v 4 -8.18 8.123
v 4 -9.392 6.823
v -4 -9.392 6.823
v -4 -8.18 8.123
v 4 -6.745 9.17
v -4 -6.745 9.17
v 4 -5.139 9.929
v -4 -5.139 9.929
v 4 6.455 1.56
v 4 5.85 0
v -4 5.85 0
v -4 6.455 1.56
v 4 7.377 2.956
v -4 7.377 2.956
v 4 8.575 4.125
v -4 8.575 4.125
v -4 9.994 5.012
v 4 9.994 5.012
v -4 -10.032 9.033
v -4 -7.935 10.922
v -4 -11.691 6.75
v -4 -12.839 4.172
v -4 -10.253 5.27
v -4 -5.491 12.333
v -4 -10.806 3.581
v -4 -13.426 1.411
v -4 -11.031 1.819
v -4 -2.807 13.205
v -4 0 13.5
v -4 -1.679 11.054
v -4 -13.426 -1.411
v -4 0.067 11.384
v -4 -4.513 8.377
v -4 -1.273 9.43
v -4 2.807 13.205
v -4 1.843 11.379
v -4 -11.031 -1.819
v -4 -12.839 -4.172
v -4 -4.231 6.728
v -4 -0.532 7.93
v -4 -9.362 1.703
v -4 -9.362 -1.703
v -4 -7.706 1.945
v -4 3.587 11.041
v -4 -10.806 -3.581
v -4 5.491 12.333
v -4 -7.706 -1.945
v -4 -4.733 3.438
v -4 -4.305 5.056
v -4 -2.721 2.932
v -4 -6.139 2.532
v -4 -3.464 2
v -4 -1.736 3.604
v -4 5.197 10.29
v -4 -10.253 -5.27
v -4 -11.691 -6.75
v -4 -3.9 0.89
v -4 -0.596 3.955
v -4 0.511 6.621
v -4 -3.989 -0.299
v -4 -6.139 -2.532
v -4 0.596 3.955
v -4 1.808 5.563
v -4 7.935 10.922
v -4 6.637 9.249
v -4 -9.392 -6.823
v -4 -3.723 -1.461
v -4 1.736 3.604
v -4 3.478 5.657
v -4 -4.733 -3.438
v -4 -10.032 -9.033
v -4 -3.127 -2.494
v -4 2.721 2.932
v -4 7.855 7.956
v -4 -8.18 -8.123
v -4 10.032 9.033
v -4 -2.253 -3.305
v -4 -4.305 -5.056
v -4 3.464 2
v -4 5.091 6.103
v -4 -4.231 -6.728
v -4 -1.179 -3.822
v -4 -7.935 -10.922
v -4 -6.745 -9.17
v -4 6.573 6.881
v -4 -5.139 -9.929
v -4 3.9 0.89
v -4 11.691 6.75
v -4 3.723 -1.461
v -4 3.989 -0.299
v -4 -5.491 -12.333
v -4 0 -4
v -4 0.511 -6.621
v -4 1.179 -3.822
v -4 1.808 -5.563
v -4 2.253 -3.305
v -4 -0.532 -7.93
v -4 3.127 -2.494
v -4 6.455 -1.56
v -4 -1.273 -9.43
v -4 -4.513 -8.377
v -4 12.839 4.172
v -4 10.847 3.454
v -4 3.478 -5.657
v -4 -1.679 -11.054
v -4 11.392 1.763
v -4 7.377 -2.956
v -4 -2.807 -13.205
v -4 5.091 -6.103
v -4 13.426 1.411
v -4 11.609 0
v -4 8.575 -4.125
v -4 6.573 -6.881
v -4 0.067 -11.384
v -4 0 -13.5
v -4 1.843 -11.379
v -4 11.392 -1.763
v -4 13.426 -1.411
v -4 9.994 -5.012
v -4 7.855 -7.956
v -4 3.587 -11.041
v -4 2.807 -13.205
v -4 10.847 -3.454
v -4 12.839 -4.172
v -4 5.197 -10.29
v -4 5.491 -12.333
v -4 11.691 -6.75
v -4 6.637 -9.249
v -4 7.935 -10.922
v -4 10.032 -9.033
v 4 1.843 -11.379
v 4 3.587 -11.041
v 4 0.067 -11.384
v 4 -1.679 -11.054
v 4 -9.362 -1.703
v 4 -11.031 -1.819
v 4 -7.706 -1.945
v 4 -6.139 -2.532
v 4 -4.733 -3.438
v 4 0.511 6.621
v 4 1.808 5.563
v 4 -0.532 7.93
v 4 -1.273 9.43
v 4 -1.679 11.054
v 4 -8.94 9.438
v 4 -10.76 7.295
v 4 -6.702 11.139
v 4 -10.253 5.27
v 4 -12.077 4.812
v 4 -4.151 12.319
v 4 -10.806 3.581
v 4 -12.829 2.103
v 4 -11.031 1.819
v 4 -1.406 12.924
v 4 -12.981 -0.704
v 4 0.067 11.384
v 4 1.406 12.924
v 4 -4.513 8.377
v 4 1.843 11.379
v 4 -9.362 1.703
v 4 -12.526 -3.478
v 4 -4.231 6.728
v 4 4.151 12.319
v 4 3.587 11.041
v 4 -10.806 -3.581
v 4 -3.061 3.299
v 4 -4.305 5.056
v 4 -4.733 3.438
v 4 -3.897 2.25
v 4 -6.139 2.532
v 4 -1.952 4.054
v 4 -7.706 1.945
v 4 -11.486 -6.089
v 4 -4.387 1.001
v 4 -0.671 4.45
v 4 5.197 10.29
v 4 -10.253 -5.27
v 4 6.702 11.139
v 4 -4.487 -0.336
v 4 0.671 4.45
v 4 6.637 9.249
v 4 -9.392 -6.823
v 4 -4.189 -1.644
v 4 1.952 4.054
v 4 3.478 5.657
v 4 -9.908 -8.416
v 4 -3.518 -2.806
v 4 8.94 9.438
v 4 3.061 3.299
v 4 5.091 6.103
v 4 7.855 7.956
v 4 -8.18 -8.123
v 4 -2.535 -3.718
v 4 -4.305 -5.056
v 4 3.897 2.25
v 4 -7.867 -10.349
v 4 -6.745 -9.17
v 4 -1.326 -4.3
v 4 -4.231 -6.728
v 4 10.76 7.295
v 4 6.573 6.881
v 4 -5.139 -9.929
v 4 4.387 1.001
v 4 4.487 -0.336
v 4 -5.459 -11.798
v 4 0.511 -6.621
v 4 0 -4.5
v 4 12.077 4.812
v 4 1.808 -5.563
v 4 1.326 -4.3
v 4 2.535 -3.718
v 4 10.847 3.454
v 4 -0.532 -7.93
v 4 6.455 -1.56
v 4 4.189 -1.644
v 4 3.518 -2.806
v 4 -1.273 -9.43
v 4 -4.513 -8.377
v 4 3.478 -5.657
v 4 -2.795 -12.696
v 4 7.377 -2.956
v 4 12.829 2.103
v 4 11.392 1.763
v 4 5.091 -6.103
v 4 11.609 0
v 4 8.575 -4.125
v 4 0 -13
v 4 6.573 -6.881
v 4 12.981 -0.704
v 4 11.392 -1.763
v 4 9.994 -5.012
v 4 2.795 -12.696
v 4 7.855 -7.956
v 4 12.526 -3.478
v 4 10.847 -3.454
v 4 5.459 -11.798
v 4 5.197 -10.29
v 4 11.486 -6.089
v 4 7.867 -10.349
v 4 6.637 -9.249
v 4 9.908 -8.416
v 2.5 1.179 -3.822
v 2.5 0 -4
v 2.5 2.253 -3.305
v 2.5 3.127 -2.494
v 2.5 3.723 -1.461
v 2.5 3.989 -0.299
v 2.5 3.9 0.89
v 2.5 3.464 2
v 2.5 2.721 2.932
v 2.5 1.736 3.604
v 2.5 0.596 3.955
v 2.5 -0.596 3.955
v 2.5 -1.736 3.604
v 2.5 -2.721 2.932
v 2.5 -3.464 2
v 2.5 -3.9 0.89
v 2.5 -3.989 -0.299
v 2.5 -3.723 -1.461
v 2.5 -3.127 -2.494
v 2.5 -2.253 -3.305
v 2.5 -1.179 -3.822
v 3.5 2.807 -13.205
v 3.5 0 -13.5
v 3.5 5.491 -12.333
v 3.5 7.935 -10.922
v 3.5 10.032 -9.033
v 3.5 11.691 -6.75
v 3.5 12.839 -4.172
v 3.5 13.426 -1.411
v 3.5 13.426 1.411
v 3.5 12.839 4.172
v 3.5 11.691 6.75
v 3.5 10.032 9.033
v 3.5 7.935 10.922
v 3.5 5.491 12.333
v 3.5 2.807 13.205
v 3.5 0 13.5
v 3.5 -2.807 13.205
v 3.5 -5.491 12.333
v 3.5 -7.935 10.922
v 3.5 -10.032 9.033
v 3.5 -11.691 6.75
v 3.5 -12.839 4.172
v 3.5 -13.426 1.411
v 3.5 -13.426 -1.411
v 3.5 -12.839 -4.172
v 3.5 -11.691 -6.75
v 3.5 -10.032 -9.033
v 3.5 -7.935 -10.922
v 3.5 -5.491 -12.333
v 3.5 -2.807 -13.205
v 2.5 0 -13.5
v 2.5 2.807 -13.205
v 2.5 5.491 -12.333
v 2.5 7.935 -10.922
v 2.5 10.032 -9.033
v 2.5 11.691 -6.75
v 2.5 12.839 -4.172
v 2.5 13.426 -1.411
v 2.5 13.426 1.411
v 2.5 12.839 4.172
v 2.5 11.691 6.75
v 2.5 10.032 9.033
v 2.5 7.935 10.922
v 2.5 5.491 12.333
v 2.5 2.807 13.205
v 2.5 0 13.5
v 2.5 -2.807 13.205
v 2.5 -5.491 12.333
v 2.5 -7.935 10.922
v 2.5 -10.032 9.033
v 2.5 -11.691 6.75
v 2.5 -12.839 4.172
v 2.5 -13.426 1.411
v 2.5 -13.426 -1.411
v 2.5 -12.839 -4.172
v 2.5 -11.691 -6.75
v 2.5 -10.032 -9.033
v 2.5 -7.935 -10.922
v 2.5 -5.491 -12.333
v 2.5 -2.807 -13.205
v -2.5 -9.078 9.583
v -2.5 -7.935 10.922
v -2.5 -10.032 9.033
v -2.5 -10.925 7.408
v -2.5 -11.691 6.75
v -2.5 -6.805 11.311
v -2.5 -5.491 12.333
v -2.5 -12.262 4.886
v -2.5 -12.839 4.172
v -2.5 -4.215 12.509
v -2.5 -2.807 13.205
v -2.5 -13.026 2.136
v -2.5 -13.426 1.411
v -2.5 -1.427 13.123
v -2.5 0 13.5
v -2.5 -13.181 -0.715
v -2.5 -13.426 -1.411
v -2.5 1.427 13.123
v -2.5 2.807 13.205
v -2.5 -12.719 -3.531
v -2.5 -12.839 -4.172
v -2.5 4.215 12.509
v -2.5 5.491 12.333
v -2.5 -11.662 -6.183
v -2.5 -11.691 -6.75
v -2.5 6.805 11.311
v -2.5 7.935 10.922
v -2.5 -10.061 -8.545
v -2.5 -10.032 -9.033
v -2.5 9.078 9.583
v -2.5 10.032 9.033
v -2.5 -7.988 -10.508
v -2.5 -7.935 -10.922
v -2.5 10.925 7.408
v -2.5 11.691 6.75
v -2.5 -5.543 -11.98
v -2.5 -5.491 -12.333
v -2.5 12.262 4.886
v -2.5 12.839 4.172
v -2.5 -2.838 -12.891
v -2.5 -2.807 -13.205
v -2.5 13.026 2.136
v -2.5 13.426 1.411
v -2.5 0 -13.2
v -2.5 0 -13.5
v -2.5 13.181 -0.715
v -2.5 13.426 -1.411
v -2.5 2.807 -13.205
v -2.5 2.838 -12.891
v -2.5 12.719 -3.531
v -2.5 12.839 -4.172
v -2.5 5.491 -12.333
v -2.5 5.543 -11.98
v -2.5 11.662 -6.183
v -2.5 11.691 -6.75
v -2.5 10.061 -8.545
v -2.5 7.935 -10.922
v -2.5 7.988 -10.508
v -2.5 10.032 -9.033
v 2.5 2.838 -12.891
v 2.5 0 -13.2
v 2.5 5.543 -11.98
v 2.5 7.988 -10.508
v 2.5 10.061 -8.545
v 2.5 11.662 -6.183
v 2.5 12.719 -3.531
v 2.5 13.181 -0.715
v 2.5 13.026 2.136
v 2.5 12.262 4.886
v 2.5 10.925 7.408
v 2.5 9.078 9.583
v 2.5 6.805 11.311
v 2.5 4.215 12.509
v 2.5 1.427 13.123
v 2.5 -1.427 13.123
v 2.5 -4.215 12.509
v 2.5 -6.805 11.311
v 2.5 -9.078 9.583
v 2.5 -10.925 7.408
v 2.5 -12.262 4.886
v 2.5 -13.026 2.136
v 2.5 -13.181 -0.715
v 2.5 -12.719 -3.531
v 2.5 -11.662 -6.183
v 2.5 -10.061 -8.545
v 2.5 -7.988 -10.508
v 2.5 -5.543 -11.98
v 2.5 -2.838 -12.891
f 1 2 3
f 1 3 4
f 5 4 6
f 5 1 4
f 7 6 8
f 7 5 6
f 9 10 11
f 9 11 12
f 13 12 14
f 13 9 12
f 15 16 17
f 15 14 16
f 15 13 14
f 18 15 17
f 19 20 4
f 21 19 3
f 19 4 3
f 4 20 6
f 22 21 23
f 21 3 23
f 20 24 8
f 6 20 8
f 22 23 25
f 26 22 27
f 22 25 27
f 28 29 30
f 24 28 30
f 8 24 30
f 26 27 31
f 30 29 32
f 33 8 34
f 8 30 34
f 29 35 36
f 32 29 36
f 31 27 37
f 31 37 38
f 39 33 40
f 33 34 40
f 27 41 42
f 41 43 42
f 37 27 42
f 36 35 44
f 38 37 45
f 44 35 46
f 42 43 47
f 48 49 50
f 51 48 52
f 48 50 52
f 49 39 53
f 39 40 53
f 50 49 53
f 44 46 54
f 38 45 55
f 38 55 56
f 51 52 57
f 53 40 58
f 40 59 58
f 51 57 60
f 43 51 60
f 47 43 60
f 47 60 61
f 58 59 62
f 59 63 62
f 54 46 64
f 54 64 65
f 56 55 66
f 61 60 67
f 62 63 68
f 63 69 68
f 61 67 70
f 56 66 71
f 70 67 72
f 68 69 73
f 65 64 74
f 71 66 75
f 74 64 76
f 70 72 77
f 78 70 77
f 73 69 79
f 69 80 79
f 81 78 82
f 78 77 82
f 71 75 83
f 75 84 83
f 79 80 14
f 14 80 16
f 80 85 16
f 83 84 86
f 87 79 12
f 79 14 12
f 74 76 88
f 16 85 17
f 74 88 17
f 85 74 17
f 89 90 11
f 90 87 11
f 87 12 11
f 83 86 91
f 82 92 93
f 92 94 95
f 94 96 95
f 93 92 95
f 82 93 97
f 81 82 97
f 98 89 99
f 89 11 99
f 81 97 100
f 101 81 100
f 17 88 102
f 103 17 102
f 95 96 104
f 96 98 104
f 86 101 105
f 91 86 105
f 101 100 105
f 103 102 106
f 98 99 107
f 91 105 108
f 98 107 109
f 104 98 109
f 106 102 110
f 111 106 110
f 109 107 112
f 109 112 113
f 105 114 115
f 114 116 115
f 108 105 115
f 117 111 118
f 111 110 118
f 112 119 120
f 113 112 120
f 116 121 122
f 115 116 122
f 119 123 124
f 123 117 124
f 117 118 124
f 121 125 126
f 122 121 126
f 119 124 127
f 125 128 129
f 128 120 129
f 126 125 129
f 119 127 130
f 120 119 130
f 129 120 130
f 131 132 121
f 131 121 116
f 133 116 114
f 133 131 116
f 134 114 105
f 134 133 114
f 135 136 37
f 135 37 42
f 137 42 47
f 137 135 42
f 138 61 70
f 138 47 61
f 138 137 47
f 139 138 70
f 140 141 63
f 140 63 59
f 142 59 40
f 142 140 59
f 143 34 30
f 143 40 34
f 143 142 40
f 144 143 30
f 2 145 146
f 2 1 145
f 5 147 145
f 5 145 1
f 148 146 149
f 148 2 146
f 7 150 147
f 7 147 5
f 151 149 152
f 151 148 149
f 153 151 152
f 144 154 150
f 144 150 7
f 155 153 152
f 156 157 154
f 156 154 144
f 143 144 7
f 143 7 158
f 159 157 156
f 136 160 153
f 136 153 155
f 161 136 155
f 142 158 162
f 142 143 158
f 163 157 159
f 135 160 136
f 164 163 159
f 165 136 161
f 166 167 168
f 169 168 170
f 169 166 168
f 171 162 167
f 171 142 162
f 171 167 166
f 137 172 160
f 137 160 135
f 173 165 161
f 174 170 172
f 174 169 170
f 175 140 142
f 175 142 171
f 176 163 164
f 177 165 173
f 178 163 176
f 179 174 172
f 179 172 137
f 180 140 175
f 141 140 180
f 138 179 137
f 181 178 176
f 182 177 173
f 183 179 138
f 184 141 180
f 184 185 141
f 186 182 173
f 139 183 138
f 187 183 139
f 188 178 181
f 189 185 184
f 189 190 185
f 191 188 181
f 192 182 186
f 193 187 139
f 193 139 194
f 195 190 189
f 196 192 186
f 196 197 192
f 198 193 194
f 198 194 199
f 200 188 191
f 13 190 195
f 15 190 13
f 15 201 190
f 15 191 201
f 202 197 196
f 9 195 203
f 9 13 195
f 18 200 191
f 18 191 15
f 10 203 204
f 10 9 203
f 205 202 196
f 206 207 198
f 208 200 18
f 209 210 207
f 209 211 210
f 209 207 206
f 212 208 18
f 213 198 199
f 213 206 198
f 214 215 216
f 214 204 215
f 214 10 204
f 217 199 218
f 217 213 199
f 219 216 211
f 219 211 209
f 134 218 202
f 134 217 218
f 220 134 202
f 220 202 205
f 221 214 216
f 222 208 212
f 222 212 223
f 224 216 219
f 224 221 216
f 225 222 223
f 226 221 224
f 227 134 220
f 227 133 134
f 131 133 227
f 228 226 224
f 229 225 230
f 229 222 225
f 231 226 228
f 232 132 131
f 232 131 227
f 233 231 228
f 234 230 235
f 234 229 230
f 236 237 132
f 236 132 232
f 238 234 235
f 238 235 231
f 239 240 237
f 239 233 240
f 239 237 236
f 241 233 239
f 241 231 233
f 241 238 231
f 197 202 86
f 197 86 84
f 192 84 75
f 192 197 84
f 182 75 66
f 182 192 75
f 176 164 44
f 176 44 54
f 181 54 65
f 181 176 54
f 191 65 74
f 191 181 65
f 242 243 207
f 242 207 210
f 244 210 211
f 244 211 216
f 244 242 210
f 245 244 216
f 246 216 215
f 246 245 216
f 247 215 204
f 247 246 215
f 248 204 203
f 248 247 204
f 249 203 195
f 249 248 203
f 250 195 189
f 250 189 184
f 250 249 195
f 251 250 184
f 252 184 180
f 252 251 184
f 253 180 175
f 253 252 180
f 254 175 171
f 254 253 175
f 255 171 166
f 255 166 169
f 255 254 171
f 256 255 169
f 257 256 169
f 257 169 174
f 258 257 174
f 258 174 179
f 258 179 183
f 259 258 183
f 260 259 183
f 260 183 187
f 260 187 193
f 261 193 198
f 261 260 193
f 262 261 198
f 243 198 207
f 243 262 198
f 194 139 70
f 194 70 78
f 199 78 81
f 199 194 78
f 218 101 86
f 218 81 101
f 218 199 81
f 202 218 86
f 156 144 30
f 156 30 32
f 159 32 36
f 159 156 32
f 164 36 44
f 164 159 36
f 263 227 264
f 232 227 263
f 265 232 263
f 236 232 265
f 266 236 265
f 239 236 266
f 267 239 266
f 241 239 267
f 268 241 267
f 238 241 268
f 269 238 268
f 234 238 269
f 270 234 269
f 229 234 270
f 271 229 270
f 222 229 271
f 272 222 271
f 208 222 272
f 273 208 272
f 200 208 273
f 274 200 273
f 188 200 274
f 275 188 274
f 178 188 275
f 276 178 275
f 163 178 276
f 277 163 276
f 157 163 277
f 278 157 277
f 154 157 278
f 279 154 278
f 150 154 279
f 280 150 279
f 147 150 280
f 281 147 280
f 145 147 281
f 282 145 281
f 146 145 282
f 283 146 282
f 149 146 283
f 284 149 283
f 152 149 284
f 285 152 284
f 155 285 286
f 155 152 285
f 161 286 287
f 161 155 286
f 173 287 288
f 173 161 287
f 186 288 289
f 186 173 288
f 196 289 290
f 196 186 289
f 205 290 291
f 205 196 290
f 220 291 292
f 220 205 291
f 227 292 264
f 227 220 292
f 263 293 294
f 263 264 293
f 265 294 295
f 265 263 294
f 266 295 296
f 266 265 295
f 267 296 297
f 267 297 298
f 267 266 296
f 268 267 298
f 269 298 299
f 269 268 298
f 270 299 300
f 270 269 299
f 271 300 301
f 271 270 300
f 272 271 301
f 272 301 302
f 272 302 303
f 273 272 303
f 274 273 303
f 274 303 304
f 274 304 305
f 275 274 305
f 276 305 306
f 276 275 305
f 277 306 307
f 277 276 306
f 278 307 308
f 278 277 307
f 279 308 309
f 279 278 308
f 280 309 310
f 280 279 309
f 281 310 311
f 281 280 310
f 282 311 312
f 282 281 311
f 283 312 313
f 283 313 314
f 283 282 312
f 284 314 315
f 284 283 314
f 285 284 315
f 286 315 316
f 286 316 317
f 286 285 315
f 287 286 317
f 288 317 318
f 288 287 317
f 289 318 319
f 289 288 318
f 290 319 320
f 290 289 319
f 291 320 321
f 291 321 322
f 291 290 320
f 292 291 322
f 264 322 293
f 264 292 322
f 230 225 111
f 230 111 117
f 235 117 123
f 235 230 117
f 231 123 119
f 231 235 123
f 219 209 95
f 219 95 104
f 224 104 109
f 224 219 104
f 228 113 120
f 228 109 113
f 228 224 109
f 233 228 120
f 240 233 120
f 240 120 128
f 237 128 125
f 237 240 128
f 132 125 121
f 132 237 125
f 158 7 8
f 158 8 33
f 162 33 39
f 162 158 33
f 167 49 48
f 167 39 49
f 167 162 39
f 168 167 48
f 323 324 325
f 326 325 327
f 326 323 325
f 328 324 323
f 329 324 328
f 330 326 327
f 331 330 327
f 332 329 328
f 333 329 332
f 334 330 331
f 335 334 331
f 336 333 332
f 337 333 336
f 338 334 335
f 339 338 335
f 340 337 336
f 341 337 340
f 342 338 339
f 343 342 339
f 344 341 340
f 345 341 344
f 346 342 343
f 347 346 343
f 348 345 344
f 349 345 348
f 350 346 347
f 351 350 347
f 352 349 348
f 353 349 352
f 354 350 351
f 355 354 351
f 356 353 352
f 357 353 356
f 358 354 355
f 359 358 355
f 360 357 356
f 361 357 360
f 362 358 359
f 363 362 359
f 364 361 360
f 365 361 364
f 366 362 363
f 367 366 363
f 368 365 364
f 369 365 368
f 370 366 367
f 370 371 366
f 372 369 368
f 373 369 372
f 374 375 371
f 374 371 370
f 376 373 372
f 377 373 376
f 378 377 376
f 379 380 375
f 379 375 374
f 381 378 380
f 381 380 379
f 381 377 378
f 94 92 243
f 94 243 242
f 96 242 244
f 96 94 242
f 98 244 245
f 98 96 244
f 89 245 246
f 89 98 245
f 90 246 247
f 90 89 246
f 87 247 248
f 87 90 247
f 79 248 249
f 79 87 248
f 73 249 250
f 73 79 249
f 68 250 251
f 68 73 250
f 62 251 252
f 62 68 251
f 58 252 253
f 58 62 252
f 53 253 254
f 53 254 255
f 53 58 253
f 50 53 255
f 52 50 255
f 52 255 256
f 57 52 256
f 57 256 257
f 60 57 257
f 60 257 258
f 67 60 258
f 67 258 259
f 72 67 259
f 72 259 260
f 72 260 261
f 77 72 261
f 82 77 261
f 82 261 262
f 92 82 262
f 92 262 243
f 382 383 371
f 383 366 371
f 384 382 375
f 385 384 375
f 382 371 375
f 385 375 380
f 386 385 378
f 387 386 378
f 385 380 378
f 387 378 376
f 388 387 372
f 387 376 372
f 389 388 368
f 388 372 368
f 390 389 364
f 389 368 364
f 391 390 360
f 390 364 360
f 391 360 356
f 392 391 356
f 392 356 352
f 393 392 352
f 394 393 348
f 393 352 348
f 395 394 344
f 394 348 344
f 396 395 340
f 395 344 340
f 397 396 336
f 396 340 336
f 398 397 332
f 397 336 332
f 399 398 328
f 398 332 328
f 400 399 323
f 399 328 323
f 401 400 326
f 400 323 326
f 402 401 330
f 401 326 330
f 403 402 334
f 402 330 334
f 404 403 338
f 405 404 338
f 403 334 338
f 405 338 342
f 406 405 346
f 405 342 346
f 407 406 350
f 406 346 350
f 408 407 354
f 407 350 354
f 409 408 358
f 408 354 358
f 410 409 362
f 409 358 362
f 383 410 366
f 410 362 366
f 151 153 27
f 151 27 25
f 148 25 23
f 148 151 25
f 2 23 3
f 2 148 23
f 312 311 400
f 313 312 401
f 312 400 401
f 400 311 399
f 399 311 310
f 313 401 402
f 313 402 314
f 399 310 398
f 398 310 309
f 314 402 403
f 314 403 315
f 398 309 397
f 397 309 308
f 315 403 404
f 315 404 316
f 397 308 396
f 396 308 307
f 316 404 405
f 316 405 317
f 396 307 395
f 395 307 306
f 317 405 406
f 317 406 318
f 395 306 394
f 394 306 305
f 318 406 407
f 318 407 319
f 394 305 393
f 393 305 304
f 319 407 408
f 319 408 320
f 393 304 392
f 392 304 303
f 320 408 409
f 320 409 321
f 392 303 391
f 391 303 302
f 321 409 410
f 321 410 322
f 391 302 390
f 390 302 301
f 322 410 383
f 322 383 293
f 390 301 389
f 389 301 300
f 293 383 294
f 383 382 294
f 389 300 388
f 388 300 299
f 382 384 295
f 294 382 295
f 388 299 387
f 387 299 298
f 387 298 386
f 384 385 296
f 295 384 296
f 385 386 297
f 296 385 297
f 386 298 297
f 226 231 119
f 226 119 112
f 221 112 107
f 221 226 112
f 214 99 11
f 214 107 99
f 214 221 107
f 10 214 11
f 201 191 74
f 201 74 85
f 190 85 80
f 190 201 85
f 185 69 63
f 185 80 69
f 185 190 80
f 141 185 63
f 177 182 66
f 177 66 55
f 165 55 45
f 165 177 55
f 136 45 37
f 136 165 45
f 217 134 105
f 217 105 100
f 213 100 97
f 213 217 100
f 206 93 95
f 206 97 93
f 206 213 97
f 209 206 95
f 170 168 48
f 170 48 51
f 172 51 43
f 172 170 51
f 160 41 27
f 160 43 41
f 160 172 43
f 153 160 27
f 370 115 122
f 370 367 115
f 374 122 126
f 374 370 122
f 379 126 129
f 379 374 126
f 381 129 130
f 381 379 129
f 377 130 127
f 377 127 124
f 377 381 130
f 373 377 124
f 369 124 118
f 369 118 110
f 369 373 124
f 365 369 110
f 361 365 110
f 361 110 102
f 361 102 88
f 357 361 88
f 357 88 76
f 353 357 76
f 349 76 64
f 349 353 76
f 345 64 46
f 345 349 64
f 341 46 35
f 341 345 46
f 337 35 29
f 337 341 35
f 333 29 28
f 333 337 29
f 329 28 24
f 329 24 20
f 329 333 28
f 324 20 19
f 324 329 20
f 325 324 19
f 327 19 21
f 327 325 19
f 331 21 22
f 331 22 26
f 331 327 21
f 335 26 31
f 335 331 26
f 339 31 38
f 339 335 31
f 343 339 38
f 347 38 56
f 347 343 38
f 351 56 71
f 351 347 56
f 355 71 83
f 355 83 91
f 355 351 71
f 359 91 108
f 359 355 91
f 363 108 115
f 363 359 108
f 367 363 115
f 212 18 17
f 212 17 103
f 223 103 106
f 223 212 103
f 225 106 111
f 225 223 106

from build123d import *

# Parameters (mm, degrees)
SKETCH1_R           = 13.5
SKETCH1_R_2         = 4
BOSS_EXTRUDE1_DEPTH = 4
CUT_EXTRUDE1_DEPTH  = 20.506409203
CIRPATTERN1_COUNT   = 5
CHAMFER1_SIZE       = 0.5
SKETCH4_R           = 13.5
SKETCH4_R_2         = 13.2
CUT_EXTRUDE3_DEPTH  = 2.5
CHAMFER2_SIZE       = 0.5
CHAMFER2_SIZE2      = 1.5


with BuildPart() as part:
    # Sketch1 → Boss-Extrude1 (new, symmetric)
    with BuildSketch(Plane(origin=(0, 0, 0), x_dir=(0, 0, -1), z_dir=(1, 0, 0))):
        Circle(SKETCH1_R)
        Circle(SKETCH1_R_2, mode=Mode.SUBTRACT)
    extrude(amount=BOSS_EXTRUDE1_DEPTH, both=True)

    # Sketch2 → Cut-Extrude1 (cut, symmetric)
    with BuildSketch(Plane(origin=(0, 0, 0), x_dir=(0, 0, -1), z_dir=(1, 0, 0))):
        with BuildLine():
            ThreePointArc((0, 5.849695328), (-2.956289657, 7.377375059), (-5.012219469, 9.99397715))
            ThreePointArc((-5.012219469, 9.99397715), (-2.621563936, 11.159720287), (0, 11.6087119))
            ThreePointArc((0, 11.6087119), (2.621563936, 11.159720287), (5.012219469, 9.99397715))
            ThreePointArc((5.012219469, 9.99397715), (2.956289657, 7.377375059), (0, 5.849695328))
        make_face()
    cut_extrude1 = extrude(amount=CUT_EXTRUDE1_DEPTH, both=True, mode=Mode.SUBTRACT)

    # CirPattern1: Cut-Extrude1 ×5 about axis
    cirpattern1_axis = Axis((0, 0, 0), (1, 0, 0))
    for i in range(1, CIRPATTERN1_COUNT):
        add(cut_extrude1.rotate(cirpattern1_axis, i * 360 / CIRPATTERN1_COUNT), mode=Mode.SUBTRACT)

    # Chamfer1
    chamfer1_edges = [part.edges().sort_by_distance(p)[0] for p in [
        (4, 0, 13.5),
    ]]
    chamfer(chamfer1_edges, length=CHAMFER1_SIZE)

    # Sketch4 → Cut-Extrude3 (cut, symmetric)
    with BuildSketch(Plane(origin=(0, 0, 0), x_dir=(0, 0, -1), z_dir=(1, 0, 0))):
        Circle(SKETCH4_R)
        Circle(SKETCH4_R_2, mode=Mode.SUBTRACT)
    extrude(amount=CUT_EXTRUDE3_DEPTH, both=True, mode=Mode.SUBTRACT)

    # Chamfer2
    chamfer2_edges = [part.edges().sort_by_distance(p)[0] for p in [
        (4, 0, 4),
    ]]
    chamfer2_side = [part.faces().sort_by_distance(p)[0] for p in [
        (4, 0, 12.632304474),
    ]]
    chamfer(chamfer2_edges, length=CHAMFER2_SIZE, length2=CHAMFER2_SIZE2, reference=chamfer2_side[0])


solid = part.part
